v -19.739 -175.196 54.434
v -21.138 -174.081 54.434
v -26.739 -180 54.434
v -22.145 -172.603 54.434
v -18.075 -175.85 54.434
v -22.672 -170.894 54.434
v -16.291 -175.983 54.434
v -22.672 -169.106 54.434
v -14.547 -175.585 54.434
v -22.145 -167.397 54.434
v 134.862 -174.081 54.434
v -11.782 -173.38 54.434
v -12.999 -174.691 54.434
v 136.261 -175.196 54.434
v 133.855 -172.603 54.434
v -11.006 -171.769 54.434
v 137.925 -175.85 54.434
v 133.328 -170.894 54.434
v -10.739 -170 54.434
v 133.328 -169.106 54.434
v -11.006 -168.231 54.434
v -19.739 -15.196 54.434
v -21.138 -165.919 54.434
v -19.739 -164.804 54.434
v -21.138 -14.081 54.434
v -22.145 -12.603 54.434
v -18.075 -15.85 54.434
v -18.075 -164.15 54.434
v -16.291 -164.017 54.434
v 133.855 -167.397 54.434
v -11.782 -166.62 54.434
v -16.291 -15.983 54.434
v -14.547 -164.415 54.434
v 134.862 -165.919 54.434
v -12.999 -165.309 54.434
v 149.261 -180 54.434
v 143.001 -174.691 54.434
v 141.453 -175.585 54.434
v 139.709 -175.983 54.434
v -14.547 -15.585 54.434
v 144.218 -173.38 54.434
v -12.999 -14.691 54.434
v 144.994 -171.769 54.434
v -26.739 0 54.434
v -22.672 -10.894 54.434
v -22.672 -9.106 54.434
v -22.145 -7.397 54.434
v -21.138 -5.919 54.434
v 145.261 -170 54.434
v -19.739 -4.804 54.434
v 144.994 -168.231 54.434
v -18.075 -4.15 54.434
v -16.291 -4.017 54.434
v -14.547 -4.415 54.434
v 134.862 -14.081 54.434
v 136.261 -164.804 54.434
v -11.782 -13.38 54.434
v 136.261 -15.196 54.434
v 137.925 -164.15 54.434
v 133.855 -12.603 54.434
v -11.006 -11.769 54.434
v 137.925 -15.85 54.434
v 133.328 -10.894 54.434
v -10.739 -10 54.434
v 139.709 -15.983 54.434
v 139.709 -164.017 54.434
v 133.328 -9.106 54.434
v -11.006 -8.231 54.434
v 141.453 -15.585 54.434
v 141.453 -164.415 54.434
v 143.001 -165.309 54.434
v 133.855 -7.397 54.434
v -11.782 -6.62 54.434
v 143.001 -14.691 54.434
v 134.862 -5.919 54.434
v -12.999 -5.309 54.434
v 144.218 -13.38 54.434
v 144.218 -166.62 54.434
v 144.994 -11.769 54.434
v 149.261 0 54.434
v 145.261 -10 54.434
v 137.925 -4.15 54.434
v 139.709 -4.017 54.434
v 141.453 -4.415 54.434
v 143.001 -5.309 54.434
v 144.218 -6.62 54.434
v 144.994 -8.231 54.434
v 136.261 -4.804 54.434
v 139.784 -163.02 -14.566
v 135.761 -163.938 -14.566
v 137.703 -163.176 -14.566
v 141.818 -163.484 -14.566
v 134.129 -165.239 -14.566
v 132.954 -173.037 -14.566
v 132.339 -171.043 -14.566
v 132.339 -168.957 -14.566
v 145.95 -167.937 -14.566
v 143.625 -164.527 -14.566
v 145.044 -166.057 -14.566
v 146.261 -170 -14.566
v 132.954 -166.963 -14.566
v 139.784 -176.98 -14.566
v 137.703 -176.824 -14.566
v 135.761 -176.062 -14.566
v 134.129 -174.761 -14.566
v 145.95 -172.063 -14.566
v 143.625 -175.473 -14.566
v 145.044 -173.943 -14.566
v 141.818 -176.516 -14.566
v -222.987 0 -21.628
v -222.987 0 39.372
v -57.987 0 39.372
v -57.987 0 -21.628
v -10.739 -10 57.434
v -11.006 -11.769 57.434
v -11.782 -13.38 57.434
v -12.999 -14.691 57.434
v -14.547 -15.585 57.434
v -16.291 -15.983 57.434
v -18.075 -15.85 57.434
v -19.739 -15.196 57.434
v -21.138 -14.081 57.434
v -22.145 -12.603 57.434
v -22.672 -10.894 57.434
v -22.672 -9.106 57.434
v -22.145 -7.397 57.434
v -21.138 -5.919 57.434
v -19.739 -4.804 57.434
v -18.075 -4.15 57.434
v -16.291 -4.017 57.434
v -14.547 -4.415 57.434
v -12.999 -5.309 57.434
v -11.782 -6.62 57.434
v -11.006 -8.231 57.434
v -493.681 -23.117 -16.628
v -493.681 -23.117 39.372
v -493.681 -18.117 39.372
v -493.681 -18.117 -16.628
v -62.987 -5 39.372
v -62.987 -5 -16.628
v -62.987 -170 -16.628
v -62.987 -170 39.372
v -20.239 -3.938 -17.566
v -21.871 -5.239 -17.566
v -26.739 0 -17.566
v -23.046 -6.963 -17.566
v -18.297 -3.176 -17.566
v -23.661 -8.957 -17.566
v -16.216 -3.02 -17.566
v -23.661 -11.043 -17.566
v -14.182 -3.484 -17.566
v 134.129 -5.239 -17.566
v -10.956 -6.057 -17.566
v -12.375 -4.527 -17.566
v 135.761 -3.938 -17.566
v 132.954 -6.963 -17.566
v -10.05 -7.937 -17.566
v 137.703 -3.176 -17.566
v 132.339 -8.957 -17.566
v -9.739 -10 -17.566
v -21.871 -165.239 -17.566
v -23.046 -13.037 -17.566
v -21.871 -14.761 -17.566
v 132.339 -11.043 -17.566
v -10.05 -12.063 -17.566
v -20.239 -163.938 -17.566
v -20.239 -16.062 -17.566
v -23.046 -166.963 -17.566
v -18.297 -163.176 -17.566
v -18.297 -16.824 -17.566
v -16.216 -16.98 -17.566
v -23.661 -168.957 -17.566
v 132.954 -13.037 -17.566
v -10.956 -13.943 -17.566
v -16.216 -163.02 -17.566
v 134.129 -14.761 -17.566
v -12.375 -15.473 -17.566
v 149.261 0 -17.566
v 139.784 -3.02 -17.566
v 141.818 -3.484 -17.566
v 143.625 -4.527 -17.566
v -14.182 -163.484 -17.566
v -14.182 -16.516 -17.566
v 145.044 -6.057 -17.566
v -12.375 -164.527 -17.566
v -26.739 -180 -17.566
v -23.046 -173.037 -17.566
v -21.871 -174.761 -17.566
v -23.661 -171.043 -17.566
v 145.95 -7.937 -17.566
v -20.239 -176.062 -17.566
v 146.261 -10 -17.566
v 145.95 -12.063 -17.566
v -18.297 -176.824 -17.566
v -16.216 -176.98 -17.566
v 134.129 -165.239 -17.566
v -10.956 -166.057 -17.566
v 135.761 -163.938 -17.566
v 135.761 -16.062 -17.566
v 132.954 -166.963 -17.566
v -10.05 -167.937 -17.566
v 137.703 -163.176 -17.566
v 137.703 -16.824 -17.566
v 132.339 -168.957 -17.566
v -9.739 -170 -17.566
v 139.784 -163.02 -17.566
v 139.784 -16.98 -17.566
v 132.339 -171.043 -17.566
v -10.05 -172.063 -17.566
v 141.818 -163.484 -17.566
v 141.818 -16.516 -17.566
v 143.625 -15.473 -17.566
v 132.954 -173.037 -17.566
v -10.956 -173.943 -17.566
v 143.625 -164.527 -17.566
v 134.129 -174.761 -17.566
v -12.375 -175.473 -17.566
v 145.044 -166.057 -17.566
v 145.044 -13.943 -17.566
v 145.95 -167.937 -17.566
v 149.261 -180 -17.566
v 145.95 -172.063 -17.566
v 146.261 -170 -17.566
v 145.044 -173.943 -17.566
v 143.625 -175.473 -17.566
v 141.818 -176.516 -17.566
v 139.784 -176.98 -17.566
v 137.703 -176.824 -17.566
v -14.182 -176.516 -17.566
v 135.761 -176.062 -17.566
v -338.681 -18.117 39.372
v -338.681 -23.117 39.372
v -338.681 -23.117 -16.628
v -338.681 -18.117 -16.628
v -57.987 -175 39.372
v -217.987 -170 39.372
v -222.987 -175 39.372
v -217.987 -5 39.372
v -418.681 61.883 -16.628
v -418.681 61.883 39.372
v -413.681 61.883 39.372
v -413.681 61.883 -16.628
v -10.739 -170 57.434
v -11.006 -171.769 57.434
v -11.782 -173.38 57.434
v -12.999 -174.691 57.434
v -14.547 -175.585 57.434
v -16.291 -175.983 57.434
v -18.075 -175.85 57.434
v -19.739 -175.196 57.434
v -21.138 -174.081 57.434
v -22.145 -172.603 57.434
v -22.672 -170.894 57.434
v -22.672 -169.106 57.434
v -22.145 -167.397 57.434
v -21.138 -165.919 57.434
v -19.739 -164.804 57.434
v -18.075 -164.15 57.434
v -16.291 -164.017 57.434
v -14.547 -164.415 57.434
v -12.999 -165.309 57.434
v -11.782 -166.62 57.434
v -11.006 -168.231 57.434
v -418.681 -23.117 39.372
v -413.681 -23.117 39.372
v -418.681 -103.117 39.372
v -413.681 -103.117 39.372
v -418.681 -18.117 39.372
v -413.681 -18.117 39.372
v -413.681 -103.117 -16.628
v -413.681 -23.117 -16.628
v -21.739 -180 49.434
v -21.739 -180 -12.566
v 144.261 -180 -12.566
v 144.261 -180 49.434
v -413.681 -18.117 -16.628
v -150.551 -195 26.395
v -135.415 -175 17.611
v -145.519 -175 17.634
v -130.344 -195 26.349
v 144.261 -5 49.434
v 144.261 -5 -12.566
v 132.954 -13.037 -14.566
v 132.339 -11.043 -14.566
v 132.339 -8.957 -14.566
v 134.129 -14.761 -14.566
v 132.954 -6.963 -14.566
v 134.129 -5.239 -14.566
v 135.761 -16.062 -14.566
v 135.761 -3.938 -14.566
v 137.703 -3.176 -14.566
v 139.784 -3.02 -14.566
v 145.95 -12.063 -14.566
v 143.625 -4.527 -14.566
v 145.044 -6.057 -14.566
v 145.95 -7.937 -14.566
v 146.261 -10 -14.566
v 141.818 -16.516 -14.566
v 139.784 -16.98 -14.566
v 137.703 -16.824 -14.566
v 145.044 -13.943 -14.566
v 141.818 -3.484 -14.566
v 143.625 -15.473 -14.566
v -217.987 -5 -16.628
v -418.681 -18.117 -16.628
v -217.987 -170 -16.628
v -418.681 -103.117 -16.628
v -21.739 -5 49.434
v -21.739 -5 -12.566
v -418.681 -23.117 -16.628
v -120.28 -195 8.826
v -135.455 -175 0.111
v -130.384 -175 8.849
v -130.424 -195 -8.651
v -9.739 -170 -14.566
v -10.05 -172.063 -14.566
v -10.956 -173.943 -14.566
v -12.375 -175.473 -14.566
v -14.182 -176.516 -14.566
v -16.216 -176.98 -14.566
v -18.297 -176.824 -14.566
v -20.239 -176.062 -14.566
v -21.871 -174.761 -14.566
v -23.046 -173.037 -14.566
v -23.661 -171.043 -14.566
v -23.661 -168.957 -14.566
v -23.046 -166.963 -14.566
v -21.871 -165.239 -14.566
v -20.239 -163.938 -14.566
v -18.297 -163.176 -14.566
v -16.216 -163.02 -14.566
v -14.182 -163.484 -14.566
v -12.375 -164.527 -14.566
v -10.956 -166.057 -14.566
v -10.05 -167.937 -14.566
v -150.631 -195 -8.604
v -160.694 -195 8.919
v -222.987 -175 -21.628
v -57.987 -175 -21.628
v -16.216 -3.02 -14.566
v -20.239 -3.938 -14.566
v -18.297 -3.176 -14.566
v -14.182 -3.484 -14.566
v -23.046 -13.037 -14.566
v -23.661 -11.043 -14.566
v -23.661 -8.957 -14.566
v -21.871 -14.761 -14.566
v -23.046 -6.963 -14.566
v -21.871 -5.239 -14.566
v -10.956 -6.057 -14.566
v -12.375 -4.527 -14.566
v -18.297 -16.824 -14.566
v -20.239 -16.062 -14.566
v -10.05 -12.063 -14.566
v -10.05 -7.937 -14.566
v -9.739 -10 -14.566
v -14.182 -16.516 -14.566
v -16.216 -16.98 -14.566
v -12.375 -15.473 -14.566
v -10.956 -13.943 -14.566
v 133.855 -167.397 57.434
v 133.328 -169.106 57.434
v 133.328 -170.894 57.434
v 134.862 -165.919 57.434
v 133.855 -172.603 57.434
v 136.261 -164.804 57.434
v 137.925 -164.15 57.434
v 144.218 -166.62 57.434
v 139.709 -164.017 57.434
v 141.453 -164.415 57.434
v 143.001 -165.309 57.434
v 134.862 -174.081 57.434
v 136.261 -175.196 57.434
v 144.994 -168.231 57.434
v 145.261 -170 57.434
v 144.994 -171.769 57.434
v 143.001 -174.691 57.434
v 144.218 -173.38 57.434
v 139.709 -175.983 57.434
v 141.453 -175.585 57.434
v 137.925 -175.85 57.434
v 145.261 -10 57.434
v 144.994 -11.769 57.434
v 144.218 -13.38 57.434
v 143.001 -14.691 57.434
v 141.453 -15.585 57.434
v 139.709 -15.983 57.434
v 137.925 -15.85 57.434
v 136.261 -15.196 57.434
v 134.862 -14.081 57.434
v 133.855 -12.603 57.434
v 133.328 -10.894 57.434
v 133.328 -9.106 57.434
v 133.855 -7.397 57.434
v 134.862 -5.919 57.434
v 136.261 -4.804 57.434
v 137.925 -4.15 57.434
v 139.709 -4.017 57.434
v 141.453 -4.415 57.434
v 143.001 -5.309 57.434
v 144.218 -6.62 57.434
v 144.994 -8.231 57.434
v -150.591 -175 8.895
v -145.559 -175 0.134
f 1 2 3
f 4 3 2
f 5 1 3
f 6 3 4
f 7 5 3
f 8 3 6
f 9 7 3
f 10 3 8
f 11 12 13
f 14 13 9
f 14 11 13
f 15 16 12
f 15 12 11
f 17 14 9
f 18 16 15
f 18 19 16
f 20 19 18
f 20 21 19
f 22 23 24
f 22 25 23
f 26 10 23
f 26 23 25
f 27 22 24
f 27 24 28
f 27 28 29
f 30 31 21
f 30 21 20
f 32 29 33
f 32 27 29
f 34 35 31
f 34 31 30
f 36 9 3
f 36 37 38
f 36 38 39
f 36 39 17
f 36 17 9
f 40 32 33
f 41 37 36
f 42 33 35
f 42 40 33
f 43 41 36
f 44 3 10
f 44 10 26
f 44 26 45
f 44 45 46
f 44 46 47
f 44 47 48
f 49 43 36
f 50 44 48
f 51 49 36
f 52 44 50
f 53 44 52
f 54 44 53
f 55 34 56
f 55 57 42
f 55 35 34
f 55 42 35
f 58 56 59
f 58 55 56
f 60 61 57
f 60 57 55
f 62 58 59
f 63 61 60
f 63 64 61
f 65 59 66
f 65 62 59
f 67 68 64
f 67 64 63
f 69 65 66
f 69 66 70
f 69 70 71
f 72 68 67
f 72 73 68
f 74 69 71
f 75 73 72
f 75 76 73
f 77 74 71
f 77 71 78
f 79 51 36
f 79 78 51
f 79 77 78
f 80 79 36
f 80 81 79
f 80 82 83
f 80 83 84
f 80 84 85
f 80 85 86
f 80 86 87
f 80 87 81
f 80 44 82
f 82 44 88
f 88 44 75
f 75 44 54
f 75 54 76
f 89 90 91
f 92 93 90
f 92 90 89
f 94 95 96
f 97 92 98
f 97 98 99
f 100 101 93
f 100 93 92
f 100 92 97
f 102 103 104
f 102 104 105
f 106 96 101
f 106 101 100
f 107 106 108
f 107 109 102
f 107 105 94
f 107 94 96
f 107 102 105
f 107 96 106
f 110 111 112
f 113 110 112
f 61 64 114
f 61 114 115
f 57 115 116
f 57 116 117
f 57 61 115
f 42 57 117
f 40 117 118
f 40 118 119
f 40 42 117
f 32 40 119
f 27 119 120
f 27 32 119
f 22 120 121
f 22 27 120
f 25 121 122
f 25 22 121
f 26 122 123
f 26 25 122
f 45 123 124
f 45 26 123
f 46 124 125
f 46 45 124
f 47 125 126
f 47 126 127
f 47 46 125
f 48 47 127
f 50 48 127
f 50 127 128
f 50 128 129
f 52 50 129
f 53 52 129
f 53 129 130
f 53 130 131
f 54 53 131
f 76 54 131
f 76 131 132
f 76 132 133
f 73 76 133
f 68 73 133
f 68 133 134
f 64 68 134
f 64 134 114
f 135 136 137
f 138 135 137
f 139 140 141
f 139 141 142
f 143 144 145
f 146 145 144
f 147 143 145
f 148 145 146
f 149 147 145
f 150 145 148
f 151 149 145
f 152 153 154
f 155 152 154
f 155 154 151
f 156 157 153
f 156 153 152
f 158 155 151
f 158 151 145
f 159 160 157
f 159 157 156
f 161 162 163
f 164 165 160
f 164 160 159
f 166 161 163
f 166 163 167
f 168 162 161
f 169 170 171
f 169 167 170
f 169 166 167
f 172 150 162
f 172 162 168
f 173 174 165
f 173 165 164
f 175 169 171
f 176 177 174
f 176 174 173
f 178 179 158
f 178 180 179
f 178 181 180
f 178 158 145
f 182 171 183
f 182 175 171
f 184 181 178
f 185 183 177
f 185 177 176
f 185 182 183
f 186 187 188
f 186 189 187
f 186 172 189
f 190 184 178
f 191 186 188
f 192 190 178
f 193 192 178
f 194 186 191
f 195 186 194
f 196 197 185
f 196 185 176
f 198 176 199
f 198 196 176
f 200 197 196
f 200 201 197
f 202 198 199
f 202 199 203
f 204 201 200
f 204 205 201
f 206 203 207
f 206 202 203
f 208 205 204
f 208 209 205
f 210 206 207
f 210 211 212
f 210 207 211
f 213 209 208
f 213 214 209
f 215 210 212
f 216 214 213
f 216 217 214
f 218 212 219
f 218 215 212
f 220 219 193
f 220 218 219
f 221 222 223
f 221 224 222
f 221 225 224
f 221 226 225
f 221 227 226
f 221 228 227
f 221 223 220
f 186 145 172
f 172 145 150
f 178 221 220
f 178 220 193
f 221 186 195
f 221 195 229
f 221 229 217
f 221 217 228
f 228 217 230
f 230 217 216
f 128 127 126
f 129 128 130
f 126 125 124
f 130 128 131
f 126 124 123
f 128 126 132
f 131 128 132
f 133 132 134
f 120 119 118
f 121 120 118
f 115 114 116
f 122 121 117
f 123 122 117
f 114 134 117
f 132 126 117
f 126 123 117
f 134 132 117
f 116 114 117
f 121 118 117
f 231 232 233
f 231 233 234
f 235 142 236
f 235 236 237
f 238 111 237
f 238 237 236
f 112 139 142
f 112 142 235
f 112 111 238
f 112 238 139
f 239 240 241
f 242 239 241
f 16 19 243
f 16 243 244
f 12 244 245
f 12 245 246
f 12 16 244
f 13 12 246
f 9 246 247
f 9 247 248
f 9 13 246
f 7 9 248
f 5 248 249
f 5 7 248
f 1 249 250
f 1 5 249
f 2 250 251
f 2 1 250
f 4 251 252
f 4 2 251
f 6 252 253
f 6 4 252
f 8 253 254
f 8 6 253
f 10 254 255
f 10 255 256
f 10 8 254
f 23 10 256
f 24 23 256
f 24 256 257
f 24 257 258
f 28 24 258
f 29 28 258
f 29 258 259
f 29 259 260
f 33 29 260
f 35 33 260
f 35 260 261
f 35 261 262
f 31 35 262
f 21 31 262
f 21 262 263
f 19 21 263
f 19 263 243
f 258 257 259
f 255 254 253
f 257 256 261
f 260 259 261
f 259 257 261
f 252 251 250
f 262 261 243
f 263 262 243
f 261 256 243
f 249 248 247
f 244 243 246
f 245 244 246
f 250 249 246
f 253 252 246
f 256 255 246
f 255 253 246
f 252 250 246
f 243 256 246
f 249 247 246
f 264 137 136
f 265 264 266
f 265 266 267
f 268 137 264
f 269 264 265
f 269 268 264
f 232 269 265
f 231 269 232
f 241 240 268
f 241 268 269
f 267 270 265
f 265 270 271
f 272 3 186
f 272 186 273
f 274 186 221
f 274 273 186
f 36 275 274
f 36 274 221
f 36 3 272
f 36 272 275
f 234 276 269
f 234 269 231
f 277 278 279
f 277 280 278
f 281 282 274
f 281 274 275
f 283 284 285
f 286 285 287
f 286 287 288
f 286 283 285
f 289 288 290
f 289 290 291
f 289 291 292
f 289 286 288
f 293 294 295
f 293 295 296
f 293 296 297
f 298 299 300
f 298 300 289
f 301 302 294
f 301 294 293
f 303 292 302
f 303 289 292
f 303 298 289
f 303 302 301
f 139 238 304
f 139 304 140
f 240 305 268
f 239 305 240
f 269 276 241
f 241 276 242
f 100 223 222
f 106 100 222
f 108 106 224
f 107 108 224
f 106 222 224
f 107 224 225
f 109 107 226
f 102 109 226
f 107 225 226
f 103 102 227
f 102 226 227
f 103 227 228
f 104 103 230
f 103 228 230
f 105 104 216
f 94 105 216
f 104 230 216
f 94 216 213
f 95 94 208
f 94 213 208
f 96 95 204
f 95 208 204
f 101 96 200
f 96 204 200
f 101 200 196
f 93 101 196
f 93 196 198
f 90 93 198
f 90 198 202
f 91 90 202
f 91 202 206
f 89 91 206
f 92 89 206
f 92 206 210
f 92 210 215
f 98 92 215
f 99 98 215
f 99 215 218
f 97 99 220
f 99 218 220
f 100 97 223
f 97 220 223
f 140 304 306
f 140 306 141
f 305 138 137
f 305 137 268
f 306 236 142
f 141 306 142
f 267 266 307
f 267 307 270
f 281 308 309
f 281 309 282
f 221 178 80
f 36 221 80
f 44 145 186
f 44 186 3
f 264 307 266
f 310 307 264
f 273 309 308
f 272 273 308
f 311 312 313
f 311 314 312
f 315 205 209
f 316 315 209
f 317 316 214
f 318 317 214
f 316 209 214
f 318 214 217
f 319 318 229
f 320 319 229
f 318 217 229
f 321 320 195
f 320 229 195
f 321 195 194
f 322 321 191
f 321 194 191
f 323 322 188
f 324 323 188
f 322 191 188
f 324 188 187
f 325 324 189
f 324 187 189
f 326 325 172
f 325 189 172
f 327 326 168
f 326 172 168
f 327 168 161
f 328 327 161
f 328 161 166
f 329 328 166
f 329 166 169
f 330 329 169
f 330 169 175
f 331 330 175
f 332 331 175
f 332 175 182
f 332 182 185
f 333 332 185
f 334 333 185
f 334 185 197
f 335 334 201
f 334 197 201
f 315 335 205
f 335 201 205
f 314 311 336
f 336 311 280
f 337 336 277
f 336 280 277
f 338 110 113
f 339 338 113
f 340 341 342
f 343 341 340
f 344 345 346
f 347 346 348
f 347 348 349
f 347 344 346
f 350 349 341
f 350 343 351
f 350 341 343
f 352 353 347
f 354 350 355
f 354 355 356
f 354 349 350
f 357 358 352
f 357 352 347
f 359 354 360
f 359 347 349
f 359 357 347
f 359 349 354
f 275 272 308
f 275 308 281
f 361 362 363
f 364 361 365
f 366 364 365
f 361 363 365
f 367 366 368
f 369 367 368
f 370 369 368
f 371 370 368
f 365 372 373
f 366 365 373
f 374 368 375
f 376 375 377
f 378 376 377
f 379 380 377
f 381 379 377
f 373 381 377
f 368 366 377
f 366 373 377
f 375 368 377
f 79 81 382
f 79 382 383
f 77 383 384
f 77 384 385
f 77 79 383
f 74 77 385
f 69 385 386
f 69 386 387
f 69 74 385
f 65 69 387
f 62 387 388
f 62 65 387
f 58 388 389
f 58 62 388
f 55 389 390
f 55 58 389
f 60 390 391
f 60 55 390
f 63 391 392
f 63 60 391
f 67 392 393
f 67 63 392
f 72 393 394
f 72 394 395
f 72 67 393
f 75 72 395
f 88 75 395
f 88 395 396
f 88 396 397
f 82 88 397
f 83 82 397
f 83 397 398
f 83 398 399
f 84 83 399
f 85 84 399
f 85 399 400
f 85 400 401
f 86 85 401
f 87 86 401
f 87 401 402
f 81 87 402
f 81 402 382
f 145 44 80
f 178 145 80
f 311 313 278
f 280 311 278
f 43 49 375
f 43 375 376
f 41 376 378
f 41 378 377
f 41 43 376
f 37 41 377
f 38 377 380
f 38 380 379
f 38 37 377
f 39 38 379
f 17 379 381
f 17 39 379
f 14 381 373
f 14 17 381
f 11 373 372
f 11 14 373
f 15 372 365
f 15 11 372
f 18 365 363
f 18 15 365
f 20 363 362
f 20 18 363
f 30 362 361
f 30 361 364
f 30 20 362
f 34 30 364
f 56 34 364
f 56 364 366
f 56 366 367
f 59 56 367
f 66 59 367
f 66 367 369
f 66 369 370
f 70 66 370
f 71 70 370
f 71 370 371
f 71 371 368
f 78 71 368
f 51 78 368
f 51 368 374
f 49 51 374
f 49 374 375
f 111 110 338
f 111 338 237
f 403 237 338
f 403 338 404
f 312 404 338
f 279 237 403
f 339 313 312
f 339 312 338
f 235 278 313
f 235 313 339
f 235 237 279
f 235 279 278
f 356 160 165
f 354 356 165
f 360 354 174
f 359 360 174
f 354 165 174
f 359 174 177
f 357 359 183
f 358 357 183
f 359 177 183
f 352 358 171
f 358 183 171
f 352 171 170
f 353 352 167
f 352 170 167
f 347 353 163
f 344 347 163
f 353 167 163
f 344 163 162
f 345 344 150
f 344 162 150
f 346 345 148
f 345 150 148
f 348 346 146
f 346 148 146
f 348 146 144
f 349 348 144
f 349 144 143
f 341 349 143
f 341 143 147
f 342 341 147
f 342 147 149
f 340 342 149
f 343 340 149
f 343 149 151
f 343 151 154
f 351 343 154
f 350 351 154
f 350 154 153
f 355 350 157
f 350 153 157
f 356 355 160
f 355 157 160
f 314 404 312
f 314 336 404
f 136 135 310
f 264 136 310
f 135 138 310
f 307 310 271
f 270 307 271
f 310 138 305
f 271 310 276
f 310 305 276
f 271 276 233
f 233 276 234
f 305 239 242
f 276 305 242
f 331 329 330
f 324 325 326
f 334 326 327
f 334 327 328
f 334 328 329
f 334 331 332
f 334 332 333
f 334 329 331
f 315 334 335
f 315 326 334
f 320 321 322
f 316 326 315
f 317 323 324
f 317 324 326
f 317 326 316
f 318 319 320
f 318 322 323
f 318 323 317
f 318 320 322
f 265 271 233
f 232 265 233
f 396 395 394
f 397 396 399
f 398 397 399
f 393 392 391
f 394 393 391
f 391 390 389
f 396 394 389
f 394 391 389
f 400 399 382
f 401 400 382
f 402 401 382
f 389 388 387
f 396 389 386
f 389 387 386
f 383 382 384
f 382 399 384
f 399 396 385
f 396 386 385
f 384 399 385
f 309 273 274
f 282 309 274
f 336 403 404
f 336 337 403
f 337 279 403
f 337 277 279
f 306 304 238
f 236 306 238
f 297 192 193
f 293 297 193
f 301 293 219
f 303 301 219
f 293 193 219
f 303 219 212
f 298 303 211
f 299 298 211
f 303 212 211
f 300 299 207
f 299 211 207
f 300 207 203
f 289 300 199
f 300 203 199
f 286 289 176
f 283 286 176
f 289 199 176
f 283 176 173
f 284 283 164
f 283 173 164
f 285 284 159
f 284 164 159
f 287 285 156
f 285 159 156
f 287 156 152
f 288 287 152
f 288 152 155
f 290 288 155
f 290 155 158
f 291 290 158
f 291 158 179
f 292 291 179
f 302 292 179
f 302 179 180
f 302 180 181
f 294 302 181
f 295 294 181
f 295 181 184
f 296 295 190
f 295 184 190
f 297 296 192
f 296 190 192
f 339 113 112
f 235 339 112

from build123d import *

# Parameters (mm, degrees)
F0_W      = 166
F0_H      = 62
F1_DEPTH  = 5
F0_W_2    = 176
F0_H_2    = 72
F2_DEPTH  = 180
F3_W      = 165
F3_H      = 61
F4_DEPTH  = 175
F5_T      = -5
F10_R     = 6
F11_DEPTH = 75
F10_R_2   = 7
F12_DEPTH = 3
F13_DEPTH = 314
F14_DEPTH = 5
F15_W     = 5
F15_H     = 80
F15_W_2   = 75
F15_H_2   = 5
F16_DEPTH = 56
F17_DEPTH = 3
F17_TAPER = -3


with BuildPart() as f1:
    # F0 (on Front) → F1 (new body)
    with BuildSketch(Plane.XZ):
        with Locations((61.2605069876, 18.4339095503)):
            Rectangle(F0_W, F0_H)
    extrude(amount=F1_DEPTH)

    # F0 (on Front) → F2 (join)
    with BuildSketch(Plane.XZ):
        with Locations((61.2605069876, 18.4339095503)):
            Rectangle(F0_W_2, F0_H_2)
        with Locations((61.2605069876, 18.4339095503)):
            Rectangle(F0_W, F0_H, mode=Mode.SUBTRACT)
    extrude(amount=F2_DEPTH)

    # F10 (on face) → F11 (join)
    with BuildSketch(Plane(origin=(0, 0, -17.5660904497), x_dir=(1, 0, 0), z_dir=(0, 0, -1))):
        with Locations((-16.7394930124, 170)):
            Circle(F10_R)
        with Locations((139.2605069876, 170)):
            Circle(F10_R)
        with Locations((139.2605069876, 10)):
            Circle(F10_R)
        with Locations((-16.7394930124, 10)):
            Circle(F10_R)
    extrude(amount=-F11_DEPTH)

    # F10 (on face) → F12 (cut)
    with BuildSketch(Plane(origin=(0, 0, -17.5660904497), x_dir=(1, 0, 0), z_dir=(0, 0, -1))):
        with Locations((-16.7394930124, 170)):
            Circle(F10_R_2)
        with Locations((-16.7394930124, 170)):
            Circle(F10_R, mode=Mode.SUBTRACT)
        with Locations((139.2605069876, 170)):
            Circle(F10_R_2)
        with Locations((139.2605069876, 170)):
            Circle(F10_R, mode=Mode.SUBTRACT)
        with Locations((139.2605069876, 10)):
            Circle(F10_R_2)
        with Locations((139.2605069876, 10)):
            Circle(F10_R, mode=Mode.SUBTRACT)
        with Locations((-16.7394930124, 10)):
            Circle(F10_R_2)
        with Locations((-16.7394930124, 10)):
            Circle(F10_R, mode=Mode.SUBTRACT)
    extrude(amount=-F12_DEPTH, mode=Mode.SUBTRACT)

    # F0 (on Front) → F13 (cut)
    with BuildSketch(Plane.XZ):
        with Locations((61.2605069876, 18.4339095503)):
            Rectangle(F0_W, F0_H)
    extrude(amount=F13_DEPTH, mode=Mode.SUBTRACT)

    # F0 (on Front) → F14 (join)
    with BuildSketch(Plane.XZ):
        with Locations((61.2605069876, 18.4339095503)):
            Rectangle(F0_W, F0_H)
    extrude(amount=F14_DEPTH)

    # F10 (on face) → F17 (cut)
    with BuildSketch(Plane(origin=(0, 0, -17.5660904497), x_dir=(1, 0, 0), z_dir=(0, 0, -1))):
        with Locations((-16.7394930124, 10)):
            Circle(F10_R)
        with Locations((139.2605069876, 10)):
            Circle(F10_R)
        with Locations((139.2605069876, 170)):
            Circle(F10_R)
        with Locations((-16.7394930124, 170)):
            Circle(F10_R)
    extrude(amount=-F17_DEPTH, taper=F17_TAPER, mode=Mode.SUBTRACT)


with BuildPart() as f4:
    # F3 (on Front) → F4 (new body)
    with BuildSketch(Plane.XZ):
        with Locations((-140.4871451855, 8.8723950386)):
            Rectangle(F3_W, F3_H)
    extrude(amount=F4_DEPTH)

    # F5
    f5_openings = [f4.faces().sort_by_distance(p)[0] for p in [
        (-140.487145, -87.5, 39.372395),
    ]]
    offset(amount=F5_T, openings=f5_openings)

    # F6 (on face) → F9 section 0
    with BuildSketch(Plane.XZ.offset(175)):
        Polygon((-130.3835418418, 8.8493124353), (-135.4153533928, 17.6108309024), (-145.5189567365, 17.6339135056), (-150.5907485292, 8.8954776419), (-145.5589369781, 0.1339591748), (-135.4553336344, 0.1108765716), align=None)
    # F8 (on offset) → F9 section 1
    with BuildSketch(Plane.XZ.offset(195)):
        Polygon((-120.2799384981, 8.8262298321), (-130.3435616002, 26.3492667662), (-150.5507682876, 26.3954319727), (-160.6943518729, 8.9185602451), (-150.6307287708, -8.6044766889), (-130.4235220834, -8.6506418955), align=None)
    loft()


with BuildPart() as f16:
    # F15 (on face) → F16 (new body)
    with BuildSketch(Plane.XY.offset(-16.6276049614)):
        with Locations((-416.180999279, 21.8830779195)):
            Rectangle(F15_W, F15_H)
        with Locations((-456.180999279, -20.6169220805)):
            Rectangle(F15_W_2, F15_H_2)
        with Locations((-416.180999279, -20.6169220805)):
            Rectangle(F15_W, F15_H_2)
        with Locations((-376.180999279, -20.6169220805)):
            Rectangle(F15_W_2, F15_H_2)
        with Locations((-416.180999279, -63.1169220805)):
            Rectangle(F15_W, F15_H)
    extrude(amount=F16_DEPTH)


solid = Compound([f1.part, f4.part, f16.part])
